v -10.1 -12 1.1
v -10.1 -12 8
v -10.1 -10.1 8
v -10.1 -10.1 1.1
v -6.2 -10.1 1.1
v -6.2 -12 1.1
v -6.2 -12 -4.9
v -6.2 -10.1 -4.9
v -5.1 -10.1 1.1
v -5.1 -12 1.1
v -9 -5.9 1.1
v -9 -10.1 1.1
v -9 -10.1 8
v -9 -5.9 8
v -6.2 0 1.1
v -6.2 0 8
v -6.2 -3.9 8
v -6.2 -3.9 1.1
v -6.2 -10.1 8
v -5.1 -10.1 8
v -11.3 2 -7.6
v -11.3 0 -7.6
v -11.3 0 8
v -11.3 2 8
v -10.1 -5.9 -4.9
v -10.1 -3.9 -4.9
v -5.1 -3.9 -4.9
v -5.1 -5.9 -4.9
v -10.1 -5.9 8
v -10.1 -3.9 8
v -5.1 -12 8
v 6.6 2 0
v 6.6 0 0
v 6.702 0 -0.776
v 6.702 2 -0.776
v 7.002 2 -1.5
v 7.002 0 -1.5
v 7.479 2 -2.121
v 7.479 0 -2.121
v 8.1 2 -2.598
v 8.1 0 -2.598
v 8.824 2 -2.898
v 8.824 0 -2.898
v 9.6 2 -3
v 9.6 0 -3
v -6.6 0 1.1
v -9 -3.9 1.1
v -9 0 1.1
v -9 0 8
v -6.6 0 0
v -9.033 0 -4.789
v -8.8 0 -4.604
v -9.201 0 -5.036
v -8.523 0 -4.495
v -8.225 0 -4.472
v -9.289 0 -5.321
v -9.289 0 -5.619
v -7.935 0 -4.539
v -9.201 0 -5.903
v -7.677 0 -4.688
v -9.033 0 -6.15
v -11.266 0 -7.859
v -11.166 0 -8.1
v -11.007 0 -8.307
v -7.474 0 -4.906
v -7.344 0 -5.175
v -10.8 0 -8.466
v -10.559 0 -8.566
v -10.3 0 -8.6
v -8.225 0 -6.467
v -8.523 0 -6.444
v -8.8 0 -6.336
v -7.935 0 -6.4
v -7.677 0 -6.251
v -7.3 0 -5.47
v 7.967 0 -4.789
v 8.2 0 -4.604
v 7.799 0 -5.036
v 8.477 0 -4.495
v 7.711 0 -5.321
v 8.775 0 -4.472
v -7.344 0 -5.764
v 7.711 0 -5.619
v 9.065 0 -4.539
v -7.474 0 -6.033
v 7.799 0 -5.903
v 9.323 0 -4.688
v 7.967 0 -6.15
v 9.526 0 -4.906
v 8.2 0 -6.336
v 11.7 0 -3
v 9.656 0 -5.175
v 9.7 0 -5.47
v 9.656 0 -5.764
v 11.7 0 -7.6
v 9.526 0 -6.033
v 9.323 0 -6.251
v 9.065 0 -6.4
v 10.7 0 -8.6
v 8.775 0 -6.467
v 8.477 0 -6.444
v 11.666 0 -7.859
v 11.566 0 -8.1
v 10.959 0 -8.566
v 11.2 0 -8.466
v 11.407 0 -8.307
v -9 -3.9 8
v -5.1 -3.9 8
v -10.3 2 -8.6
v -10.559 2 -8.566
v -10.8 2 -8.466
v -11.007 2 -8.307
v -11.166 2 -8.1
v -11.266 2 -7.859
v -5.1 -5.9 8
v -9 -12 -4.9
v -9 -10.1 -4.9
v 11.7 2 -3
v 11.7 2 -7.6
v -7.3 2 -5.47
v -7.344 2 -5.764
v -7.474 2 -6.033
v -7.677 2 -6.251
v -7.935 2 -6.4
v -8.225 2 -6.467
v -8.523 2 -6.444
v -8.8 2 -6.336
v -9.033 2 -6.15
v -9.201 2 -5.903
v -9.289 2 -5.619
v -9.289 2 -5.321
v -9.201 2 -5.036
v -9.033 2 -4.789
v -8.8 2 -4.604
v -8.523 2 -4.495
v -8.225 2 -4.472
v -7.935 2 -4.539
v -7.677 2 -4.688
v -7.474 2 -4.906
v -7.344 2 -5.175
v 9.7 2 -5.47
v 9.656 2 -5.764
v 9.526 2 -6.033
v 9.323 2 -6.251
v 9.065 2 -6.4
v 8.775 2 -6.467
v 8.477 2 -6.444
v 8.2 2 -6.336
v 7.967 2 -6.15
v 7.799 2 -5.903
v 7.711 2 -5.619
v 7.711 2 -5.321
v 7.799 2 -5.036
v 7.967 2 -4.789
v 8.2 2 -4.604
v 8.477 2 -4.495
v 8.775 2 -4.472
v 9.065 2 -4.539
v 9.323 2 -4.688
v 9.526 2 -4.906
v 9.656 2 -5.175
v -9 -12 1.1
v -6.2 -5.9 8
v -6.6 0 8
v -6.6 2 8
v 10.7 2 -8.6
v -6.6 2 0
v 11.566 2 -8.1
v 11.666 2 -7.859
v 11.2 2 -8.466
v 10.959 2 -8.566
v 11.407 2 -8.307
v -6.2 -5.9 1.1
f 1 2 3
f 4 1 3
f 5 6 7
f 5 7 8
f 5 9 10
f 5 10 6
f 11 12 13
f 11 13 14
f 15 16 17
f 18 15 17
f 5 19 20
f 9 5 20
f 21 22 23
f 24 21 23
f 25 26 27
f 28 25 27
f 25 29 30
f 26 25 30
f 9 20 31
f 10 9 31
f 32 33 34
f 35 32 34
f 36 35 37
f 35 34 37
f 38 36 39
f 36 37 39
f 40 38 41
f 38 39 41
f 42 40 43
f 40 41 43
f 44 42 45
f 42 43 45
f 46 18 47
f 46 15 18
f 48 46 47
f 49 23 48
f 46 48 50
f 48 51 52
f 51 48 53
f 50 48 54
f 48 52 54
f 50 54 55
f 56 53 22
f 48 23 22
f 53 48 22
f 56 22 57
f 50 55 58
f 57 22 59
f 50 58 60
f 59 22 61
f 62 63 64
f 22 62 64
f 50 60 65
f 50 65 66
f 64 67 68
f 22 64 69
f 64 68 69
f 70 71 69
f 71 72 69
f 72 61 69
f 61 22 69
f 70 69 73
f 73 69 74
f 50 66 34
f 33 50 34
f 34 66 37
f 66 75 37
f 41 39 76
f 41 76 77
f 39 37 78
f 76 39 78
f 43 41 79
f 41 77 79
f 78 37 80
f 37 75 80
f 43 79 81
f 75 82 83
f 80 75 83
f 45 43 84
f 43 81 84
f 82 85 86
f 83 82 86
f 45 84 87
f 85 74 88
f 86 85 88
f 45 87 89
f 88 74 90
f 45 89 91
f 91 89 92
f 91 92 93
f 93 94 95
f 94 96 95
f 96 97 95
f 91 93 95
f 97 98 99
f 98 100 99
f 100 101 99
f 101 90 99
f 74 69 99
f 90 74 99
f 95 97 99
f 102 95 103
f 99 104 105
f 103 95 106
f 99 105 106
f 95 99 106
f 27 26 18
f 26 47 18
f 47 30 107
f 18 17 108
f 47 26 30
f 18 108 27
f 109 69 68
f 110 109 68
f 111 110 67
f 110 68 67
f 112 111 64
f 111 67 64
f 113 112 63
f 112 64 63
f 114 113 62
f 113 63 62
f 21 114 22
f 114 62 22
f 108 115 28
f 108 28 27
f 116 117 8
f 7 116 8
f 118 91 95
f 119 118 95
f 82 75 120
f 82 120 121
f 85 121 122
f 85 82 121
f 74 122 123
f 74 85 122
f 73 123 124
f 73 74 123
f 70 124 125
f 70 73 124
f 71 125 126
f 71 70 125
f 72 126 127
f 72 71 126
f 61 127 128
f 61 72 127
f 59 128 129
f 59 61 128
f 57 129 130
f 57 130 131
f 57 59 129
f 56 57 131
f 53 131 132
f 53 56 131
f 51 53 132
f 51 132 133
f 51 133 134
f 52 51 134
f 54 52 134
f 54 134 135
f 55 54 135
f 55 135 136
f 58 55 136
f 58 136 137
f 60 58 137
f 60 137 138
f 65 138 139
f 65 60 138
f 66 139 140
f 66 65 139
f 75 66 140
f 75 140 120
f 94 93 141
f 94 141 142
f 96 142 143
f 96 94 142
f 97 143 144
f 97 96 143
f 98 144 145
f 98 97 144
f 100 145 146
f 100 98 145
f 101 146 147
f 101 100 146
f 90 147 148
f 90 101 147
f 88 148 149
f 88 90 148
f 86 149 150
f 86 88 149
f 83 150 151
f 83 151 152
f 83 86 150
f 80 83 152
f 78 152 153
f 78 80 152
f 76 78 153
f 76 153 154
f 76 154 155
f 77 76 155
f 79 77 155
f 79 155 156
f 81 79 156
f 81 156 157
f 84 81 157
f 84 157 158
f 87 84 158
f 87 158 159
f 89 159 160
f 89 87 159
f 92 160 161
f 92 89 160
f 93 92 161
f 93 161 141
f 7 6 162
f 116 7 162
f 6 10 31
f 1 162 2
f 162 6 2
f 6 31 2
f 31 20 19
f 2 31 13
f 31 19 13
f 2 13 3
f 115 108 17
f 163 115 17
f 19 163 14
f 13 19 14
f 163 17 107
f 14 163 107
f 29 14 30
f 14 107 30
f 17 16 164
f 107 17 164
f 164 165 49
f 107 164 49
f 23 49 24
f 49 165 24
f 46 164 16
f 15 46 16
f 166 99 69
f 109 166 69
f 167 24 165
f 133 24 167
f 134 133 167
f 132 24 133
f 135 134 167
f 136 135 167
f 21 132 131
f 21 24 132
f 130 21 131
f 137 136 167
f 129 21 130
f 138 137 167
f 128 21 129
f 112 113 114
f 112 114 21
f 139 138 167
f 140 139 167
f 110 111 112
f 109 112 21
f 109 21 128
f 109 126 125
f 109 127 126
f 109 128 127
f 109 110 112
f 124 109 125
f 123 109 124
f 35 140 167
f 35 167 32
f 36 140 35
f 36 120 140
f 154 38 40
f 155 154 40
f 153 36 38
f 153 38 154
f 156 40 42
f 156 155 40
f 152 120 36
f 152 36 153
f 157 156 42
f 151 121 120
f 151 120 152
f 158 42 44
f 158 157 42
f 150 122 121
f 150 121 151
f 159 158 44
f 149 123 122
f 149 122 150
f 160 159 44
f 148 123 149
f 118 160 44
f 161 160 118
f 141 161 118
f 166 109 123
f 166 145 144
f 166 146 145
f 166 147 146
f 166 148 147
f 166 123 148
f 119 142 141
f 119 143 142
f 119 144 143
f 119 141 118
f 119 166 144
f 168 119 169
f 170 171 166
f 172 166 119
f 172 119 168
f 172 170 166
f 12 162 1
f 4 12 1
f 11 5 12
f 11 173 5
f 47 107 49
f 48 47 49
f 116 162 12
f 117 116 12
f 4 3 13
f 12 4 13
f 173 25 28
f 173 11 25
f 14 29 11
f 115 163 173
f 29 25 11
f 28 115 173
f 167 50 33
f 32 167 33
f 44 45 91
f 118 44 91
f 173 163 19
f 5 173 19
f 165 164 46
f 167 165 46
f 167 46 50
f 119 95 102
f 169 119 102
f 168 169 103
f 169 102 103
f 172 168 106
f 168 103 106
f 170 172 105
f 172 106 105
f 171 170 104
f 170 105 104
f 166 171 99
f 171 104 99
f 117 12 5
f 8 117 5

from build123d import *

# Parameters (mm, degrees)
SKETCH1_R           = 1
BOSS_EXTRUDE1_DEPTH = 2
BOSS_EXTRUDE2_START = 8
BOSS_EXTRUDE2_DEPTH = 6.9
SKETCH3_W           = 2.8
SKETCH3_H           = 1.9
SKETCH3_W_2         = 5
SKETCH3_H_2         = 2
BOSS_EXTRUDE3_DEPTH = 12.9


with BuildPart() as part:
    # Sketch1 → Boss-Extrude1 (new body)
    with BuildSketch(Plane(origin=(0, 0, 0), x_dir=(1, 0, 0), z_dir=(0, 1, 0))):
        with BuildLine():
            Line((11.7, 3), (11.7, 7.6))
            ThreePointArc((11.7, 7.6), (11.407106781, 8.307106781), (10.7, 8.6))
            Line((10.7, 8.6), (-10.3, 8.6))
            ThreePointArc((-10.3, 8.6), (-11.007106781, 8.307106781), (-11.3, 7.6))
            Line((-11.3, 7.6), (-11.3, -8))
            Line((-11.3, -8), (-6.6, -8))
            Line((-6.6, -8), (-6.6, 0))
            Line((-6.6, 0), (6.6, 0))
            ThreePointArc((6.6, 0), (7.478679656, 2.121320344), (9.6, 3))
            Line((9.6, 3), (11.7, 3))
        make_face()
        with Locations((8.7, 5.469565217)):
            Circle(SKETCH1_R, mode=Mode.SUBTRACT)
        with Locations((-8.3, 5.469565217)):
            Circle(SKETCH1_R, mode=Mode.SUBTRACT)
    extrude(amount=BOSS_EXTRUDE1_DEPTH)

    # Sketch2 → Boss-Extrude2 (add)
    with BuildSketch(Plane.XY.offset(BOSS_EXTRUDE2_START)):
        Polygon((-9, -10.1), (-9, 0), (-6.2, 0), (-6.2, -10.1), (-5.1, -10.1), (-5.1, -12), (-10.1, -12), (-10.1, -10.1), align=None)
    extrude(amount=-BOSS_EXTRUDE2_DEPTH)

    # Sketch3 → Boss-Extrude3 (add)
    with BuildSketch(Plane.XY.offset(8)):
        with Locations((-7.6, -11.05)):
            Rectangle(SKETCH3_W, SKETCH3_H)
        with Locations((-7.6, -4.9)):
            Rectangle(SKETCH3_W_2, SKETCH3_H_2)
    extrude(amount=-BOSS_EXTRUDE3_DEPTH)


solid = part.part
